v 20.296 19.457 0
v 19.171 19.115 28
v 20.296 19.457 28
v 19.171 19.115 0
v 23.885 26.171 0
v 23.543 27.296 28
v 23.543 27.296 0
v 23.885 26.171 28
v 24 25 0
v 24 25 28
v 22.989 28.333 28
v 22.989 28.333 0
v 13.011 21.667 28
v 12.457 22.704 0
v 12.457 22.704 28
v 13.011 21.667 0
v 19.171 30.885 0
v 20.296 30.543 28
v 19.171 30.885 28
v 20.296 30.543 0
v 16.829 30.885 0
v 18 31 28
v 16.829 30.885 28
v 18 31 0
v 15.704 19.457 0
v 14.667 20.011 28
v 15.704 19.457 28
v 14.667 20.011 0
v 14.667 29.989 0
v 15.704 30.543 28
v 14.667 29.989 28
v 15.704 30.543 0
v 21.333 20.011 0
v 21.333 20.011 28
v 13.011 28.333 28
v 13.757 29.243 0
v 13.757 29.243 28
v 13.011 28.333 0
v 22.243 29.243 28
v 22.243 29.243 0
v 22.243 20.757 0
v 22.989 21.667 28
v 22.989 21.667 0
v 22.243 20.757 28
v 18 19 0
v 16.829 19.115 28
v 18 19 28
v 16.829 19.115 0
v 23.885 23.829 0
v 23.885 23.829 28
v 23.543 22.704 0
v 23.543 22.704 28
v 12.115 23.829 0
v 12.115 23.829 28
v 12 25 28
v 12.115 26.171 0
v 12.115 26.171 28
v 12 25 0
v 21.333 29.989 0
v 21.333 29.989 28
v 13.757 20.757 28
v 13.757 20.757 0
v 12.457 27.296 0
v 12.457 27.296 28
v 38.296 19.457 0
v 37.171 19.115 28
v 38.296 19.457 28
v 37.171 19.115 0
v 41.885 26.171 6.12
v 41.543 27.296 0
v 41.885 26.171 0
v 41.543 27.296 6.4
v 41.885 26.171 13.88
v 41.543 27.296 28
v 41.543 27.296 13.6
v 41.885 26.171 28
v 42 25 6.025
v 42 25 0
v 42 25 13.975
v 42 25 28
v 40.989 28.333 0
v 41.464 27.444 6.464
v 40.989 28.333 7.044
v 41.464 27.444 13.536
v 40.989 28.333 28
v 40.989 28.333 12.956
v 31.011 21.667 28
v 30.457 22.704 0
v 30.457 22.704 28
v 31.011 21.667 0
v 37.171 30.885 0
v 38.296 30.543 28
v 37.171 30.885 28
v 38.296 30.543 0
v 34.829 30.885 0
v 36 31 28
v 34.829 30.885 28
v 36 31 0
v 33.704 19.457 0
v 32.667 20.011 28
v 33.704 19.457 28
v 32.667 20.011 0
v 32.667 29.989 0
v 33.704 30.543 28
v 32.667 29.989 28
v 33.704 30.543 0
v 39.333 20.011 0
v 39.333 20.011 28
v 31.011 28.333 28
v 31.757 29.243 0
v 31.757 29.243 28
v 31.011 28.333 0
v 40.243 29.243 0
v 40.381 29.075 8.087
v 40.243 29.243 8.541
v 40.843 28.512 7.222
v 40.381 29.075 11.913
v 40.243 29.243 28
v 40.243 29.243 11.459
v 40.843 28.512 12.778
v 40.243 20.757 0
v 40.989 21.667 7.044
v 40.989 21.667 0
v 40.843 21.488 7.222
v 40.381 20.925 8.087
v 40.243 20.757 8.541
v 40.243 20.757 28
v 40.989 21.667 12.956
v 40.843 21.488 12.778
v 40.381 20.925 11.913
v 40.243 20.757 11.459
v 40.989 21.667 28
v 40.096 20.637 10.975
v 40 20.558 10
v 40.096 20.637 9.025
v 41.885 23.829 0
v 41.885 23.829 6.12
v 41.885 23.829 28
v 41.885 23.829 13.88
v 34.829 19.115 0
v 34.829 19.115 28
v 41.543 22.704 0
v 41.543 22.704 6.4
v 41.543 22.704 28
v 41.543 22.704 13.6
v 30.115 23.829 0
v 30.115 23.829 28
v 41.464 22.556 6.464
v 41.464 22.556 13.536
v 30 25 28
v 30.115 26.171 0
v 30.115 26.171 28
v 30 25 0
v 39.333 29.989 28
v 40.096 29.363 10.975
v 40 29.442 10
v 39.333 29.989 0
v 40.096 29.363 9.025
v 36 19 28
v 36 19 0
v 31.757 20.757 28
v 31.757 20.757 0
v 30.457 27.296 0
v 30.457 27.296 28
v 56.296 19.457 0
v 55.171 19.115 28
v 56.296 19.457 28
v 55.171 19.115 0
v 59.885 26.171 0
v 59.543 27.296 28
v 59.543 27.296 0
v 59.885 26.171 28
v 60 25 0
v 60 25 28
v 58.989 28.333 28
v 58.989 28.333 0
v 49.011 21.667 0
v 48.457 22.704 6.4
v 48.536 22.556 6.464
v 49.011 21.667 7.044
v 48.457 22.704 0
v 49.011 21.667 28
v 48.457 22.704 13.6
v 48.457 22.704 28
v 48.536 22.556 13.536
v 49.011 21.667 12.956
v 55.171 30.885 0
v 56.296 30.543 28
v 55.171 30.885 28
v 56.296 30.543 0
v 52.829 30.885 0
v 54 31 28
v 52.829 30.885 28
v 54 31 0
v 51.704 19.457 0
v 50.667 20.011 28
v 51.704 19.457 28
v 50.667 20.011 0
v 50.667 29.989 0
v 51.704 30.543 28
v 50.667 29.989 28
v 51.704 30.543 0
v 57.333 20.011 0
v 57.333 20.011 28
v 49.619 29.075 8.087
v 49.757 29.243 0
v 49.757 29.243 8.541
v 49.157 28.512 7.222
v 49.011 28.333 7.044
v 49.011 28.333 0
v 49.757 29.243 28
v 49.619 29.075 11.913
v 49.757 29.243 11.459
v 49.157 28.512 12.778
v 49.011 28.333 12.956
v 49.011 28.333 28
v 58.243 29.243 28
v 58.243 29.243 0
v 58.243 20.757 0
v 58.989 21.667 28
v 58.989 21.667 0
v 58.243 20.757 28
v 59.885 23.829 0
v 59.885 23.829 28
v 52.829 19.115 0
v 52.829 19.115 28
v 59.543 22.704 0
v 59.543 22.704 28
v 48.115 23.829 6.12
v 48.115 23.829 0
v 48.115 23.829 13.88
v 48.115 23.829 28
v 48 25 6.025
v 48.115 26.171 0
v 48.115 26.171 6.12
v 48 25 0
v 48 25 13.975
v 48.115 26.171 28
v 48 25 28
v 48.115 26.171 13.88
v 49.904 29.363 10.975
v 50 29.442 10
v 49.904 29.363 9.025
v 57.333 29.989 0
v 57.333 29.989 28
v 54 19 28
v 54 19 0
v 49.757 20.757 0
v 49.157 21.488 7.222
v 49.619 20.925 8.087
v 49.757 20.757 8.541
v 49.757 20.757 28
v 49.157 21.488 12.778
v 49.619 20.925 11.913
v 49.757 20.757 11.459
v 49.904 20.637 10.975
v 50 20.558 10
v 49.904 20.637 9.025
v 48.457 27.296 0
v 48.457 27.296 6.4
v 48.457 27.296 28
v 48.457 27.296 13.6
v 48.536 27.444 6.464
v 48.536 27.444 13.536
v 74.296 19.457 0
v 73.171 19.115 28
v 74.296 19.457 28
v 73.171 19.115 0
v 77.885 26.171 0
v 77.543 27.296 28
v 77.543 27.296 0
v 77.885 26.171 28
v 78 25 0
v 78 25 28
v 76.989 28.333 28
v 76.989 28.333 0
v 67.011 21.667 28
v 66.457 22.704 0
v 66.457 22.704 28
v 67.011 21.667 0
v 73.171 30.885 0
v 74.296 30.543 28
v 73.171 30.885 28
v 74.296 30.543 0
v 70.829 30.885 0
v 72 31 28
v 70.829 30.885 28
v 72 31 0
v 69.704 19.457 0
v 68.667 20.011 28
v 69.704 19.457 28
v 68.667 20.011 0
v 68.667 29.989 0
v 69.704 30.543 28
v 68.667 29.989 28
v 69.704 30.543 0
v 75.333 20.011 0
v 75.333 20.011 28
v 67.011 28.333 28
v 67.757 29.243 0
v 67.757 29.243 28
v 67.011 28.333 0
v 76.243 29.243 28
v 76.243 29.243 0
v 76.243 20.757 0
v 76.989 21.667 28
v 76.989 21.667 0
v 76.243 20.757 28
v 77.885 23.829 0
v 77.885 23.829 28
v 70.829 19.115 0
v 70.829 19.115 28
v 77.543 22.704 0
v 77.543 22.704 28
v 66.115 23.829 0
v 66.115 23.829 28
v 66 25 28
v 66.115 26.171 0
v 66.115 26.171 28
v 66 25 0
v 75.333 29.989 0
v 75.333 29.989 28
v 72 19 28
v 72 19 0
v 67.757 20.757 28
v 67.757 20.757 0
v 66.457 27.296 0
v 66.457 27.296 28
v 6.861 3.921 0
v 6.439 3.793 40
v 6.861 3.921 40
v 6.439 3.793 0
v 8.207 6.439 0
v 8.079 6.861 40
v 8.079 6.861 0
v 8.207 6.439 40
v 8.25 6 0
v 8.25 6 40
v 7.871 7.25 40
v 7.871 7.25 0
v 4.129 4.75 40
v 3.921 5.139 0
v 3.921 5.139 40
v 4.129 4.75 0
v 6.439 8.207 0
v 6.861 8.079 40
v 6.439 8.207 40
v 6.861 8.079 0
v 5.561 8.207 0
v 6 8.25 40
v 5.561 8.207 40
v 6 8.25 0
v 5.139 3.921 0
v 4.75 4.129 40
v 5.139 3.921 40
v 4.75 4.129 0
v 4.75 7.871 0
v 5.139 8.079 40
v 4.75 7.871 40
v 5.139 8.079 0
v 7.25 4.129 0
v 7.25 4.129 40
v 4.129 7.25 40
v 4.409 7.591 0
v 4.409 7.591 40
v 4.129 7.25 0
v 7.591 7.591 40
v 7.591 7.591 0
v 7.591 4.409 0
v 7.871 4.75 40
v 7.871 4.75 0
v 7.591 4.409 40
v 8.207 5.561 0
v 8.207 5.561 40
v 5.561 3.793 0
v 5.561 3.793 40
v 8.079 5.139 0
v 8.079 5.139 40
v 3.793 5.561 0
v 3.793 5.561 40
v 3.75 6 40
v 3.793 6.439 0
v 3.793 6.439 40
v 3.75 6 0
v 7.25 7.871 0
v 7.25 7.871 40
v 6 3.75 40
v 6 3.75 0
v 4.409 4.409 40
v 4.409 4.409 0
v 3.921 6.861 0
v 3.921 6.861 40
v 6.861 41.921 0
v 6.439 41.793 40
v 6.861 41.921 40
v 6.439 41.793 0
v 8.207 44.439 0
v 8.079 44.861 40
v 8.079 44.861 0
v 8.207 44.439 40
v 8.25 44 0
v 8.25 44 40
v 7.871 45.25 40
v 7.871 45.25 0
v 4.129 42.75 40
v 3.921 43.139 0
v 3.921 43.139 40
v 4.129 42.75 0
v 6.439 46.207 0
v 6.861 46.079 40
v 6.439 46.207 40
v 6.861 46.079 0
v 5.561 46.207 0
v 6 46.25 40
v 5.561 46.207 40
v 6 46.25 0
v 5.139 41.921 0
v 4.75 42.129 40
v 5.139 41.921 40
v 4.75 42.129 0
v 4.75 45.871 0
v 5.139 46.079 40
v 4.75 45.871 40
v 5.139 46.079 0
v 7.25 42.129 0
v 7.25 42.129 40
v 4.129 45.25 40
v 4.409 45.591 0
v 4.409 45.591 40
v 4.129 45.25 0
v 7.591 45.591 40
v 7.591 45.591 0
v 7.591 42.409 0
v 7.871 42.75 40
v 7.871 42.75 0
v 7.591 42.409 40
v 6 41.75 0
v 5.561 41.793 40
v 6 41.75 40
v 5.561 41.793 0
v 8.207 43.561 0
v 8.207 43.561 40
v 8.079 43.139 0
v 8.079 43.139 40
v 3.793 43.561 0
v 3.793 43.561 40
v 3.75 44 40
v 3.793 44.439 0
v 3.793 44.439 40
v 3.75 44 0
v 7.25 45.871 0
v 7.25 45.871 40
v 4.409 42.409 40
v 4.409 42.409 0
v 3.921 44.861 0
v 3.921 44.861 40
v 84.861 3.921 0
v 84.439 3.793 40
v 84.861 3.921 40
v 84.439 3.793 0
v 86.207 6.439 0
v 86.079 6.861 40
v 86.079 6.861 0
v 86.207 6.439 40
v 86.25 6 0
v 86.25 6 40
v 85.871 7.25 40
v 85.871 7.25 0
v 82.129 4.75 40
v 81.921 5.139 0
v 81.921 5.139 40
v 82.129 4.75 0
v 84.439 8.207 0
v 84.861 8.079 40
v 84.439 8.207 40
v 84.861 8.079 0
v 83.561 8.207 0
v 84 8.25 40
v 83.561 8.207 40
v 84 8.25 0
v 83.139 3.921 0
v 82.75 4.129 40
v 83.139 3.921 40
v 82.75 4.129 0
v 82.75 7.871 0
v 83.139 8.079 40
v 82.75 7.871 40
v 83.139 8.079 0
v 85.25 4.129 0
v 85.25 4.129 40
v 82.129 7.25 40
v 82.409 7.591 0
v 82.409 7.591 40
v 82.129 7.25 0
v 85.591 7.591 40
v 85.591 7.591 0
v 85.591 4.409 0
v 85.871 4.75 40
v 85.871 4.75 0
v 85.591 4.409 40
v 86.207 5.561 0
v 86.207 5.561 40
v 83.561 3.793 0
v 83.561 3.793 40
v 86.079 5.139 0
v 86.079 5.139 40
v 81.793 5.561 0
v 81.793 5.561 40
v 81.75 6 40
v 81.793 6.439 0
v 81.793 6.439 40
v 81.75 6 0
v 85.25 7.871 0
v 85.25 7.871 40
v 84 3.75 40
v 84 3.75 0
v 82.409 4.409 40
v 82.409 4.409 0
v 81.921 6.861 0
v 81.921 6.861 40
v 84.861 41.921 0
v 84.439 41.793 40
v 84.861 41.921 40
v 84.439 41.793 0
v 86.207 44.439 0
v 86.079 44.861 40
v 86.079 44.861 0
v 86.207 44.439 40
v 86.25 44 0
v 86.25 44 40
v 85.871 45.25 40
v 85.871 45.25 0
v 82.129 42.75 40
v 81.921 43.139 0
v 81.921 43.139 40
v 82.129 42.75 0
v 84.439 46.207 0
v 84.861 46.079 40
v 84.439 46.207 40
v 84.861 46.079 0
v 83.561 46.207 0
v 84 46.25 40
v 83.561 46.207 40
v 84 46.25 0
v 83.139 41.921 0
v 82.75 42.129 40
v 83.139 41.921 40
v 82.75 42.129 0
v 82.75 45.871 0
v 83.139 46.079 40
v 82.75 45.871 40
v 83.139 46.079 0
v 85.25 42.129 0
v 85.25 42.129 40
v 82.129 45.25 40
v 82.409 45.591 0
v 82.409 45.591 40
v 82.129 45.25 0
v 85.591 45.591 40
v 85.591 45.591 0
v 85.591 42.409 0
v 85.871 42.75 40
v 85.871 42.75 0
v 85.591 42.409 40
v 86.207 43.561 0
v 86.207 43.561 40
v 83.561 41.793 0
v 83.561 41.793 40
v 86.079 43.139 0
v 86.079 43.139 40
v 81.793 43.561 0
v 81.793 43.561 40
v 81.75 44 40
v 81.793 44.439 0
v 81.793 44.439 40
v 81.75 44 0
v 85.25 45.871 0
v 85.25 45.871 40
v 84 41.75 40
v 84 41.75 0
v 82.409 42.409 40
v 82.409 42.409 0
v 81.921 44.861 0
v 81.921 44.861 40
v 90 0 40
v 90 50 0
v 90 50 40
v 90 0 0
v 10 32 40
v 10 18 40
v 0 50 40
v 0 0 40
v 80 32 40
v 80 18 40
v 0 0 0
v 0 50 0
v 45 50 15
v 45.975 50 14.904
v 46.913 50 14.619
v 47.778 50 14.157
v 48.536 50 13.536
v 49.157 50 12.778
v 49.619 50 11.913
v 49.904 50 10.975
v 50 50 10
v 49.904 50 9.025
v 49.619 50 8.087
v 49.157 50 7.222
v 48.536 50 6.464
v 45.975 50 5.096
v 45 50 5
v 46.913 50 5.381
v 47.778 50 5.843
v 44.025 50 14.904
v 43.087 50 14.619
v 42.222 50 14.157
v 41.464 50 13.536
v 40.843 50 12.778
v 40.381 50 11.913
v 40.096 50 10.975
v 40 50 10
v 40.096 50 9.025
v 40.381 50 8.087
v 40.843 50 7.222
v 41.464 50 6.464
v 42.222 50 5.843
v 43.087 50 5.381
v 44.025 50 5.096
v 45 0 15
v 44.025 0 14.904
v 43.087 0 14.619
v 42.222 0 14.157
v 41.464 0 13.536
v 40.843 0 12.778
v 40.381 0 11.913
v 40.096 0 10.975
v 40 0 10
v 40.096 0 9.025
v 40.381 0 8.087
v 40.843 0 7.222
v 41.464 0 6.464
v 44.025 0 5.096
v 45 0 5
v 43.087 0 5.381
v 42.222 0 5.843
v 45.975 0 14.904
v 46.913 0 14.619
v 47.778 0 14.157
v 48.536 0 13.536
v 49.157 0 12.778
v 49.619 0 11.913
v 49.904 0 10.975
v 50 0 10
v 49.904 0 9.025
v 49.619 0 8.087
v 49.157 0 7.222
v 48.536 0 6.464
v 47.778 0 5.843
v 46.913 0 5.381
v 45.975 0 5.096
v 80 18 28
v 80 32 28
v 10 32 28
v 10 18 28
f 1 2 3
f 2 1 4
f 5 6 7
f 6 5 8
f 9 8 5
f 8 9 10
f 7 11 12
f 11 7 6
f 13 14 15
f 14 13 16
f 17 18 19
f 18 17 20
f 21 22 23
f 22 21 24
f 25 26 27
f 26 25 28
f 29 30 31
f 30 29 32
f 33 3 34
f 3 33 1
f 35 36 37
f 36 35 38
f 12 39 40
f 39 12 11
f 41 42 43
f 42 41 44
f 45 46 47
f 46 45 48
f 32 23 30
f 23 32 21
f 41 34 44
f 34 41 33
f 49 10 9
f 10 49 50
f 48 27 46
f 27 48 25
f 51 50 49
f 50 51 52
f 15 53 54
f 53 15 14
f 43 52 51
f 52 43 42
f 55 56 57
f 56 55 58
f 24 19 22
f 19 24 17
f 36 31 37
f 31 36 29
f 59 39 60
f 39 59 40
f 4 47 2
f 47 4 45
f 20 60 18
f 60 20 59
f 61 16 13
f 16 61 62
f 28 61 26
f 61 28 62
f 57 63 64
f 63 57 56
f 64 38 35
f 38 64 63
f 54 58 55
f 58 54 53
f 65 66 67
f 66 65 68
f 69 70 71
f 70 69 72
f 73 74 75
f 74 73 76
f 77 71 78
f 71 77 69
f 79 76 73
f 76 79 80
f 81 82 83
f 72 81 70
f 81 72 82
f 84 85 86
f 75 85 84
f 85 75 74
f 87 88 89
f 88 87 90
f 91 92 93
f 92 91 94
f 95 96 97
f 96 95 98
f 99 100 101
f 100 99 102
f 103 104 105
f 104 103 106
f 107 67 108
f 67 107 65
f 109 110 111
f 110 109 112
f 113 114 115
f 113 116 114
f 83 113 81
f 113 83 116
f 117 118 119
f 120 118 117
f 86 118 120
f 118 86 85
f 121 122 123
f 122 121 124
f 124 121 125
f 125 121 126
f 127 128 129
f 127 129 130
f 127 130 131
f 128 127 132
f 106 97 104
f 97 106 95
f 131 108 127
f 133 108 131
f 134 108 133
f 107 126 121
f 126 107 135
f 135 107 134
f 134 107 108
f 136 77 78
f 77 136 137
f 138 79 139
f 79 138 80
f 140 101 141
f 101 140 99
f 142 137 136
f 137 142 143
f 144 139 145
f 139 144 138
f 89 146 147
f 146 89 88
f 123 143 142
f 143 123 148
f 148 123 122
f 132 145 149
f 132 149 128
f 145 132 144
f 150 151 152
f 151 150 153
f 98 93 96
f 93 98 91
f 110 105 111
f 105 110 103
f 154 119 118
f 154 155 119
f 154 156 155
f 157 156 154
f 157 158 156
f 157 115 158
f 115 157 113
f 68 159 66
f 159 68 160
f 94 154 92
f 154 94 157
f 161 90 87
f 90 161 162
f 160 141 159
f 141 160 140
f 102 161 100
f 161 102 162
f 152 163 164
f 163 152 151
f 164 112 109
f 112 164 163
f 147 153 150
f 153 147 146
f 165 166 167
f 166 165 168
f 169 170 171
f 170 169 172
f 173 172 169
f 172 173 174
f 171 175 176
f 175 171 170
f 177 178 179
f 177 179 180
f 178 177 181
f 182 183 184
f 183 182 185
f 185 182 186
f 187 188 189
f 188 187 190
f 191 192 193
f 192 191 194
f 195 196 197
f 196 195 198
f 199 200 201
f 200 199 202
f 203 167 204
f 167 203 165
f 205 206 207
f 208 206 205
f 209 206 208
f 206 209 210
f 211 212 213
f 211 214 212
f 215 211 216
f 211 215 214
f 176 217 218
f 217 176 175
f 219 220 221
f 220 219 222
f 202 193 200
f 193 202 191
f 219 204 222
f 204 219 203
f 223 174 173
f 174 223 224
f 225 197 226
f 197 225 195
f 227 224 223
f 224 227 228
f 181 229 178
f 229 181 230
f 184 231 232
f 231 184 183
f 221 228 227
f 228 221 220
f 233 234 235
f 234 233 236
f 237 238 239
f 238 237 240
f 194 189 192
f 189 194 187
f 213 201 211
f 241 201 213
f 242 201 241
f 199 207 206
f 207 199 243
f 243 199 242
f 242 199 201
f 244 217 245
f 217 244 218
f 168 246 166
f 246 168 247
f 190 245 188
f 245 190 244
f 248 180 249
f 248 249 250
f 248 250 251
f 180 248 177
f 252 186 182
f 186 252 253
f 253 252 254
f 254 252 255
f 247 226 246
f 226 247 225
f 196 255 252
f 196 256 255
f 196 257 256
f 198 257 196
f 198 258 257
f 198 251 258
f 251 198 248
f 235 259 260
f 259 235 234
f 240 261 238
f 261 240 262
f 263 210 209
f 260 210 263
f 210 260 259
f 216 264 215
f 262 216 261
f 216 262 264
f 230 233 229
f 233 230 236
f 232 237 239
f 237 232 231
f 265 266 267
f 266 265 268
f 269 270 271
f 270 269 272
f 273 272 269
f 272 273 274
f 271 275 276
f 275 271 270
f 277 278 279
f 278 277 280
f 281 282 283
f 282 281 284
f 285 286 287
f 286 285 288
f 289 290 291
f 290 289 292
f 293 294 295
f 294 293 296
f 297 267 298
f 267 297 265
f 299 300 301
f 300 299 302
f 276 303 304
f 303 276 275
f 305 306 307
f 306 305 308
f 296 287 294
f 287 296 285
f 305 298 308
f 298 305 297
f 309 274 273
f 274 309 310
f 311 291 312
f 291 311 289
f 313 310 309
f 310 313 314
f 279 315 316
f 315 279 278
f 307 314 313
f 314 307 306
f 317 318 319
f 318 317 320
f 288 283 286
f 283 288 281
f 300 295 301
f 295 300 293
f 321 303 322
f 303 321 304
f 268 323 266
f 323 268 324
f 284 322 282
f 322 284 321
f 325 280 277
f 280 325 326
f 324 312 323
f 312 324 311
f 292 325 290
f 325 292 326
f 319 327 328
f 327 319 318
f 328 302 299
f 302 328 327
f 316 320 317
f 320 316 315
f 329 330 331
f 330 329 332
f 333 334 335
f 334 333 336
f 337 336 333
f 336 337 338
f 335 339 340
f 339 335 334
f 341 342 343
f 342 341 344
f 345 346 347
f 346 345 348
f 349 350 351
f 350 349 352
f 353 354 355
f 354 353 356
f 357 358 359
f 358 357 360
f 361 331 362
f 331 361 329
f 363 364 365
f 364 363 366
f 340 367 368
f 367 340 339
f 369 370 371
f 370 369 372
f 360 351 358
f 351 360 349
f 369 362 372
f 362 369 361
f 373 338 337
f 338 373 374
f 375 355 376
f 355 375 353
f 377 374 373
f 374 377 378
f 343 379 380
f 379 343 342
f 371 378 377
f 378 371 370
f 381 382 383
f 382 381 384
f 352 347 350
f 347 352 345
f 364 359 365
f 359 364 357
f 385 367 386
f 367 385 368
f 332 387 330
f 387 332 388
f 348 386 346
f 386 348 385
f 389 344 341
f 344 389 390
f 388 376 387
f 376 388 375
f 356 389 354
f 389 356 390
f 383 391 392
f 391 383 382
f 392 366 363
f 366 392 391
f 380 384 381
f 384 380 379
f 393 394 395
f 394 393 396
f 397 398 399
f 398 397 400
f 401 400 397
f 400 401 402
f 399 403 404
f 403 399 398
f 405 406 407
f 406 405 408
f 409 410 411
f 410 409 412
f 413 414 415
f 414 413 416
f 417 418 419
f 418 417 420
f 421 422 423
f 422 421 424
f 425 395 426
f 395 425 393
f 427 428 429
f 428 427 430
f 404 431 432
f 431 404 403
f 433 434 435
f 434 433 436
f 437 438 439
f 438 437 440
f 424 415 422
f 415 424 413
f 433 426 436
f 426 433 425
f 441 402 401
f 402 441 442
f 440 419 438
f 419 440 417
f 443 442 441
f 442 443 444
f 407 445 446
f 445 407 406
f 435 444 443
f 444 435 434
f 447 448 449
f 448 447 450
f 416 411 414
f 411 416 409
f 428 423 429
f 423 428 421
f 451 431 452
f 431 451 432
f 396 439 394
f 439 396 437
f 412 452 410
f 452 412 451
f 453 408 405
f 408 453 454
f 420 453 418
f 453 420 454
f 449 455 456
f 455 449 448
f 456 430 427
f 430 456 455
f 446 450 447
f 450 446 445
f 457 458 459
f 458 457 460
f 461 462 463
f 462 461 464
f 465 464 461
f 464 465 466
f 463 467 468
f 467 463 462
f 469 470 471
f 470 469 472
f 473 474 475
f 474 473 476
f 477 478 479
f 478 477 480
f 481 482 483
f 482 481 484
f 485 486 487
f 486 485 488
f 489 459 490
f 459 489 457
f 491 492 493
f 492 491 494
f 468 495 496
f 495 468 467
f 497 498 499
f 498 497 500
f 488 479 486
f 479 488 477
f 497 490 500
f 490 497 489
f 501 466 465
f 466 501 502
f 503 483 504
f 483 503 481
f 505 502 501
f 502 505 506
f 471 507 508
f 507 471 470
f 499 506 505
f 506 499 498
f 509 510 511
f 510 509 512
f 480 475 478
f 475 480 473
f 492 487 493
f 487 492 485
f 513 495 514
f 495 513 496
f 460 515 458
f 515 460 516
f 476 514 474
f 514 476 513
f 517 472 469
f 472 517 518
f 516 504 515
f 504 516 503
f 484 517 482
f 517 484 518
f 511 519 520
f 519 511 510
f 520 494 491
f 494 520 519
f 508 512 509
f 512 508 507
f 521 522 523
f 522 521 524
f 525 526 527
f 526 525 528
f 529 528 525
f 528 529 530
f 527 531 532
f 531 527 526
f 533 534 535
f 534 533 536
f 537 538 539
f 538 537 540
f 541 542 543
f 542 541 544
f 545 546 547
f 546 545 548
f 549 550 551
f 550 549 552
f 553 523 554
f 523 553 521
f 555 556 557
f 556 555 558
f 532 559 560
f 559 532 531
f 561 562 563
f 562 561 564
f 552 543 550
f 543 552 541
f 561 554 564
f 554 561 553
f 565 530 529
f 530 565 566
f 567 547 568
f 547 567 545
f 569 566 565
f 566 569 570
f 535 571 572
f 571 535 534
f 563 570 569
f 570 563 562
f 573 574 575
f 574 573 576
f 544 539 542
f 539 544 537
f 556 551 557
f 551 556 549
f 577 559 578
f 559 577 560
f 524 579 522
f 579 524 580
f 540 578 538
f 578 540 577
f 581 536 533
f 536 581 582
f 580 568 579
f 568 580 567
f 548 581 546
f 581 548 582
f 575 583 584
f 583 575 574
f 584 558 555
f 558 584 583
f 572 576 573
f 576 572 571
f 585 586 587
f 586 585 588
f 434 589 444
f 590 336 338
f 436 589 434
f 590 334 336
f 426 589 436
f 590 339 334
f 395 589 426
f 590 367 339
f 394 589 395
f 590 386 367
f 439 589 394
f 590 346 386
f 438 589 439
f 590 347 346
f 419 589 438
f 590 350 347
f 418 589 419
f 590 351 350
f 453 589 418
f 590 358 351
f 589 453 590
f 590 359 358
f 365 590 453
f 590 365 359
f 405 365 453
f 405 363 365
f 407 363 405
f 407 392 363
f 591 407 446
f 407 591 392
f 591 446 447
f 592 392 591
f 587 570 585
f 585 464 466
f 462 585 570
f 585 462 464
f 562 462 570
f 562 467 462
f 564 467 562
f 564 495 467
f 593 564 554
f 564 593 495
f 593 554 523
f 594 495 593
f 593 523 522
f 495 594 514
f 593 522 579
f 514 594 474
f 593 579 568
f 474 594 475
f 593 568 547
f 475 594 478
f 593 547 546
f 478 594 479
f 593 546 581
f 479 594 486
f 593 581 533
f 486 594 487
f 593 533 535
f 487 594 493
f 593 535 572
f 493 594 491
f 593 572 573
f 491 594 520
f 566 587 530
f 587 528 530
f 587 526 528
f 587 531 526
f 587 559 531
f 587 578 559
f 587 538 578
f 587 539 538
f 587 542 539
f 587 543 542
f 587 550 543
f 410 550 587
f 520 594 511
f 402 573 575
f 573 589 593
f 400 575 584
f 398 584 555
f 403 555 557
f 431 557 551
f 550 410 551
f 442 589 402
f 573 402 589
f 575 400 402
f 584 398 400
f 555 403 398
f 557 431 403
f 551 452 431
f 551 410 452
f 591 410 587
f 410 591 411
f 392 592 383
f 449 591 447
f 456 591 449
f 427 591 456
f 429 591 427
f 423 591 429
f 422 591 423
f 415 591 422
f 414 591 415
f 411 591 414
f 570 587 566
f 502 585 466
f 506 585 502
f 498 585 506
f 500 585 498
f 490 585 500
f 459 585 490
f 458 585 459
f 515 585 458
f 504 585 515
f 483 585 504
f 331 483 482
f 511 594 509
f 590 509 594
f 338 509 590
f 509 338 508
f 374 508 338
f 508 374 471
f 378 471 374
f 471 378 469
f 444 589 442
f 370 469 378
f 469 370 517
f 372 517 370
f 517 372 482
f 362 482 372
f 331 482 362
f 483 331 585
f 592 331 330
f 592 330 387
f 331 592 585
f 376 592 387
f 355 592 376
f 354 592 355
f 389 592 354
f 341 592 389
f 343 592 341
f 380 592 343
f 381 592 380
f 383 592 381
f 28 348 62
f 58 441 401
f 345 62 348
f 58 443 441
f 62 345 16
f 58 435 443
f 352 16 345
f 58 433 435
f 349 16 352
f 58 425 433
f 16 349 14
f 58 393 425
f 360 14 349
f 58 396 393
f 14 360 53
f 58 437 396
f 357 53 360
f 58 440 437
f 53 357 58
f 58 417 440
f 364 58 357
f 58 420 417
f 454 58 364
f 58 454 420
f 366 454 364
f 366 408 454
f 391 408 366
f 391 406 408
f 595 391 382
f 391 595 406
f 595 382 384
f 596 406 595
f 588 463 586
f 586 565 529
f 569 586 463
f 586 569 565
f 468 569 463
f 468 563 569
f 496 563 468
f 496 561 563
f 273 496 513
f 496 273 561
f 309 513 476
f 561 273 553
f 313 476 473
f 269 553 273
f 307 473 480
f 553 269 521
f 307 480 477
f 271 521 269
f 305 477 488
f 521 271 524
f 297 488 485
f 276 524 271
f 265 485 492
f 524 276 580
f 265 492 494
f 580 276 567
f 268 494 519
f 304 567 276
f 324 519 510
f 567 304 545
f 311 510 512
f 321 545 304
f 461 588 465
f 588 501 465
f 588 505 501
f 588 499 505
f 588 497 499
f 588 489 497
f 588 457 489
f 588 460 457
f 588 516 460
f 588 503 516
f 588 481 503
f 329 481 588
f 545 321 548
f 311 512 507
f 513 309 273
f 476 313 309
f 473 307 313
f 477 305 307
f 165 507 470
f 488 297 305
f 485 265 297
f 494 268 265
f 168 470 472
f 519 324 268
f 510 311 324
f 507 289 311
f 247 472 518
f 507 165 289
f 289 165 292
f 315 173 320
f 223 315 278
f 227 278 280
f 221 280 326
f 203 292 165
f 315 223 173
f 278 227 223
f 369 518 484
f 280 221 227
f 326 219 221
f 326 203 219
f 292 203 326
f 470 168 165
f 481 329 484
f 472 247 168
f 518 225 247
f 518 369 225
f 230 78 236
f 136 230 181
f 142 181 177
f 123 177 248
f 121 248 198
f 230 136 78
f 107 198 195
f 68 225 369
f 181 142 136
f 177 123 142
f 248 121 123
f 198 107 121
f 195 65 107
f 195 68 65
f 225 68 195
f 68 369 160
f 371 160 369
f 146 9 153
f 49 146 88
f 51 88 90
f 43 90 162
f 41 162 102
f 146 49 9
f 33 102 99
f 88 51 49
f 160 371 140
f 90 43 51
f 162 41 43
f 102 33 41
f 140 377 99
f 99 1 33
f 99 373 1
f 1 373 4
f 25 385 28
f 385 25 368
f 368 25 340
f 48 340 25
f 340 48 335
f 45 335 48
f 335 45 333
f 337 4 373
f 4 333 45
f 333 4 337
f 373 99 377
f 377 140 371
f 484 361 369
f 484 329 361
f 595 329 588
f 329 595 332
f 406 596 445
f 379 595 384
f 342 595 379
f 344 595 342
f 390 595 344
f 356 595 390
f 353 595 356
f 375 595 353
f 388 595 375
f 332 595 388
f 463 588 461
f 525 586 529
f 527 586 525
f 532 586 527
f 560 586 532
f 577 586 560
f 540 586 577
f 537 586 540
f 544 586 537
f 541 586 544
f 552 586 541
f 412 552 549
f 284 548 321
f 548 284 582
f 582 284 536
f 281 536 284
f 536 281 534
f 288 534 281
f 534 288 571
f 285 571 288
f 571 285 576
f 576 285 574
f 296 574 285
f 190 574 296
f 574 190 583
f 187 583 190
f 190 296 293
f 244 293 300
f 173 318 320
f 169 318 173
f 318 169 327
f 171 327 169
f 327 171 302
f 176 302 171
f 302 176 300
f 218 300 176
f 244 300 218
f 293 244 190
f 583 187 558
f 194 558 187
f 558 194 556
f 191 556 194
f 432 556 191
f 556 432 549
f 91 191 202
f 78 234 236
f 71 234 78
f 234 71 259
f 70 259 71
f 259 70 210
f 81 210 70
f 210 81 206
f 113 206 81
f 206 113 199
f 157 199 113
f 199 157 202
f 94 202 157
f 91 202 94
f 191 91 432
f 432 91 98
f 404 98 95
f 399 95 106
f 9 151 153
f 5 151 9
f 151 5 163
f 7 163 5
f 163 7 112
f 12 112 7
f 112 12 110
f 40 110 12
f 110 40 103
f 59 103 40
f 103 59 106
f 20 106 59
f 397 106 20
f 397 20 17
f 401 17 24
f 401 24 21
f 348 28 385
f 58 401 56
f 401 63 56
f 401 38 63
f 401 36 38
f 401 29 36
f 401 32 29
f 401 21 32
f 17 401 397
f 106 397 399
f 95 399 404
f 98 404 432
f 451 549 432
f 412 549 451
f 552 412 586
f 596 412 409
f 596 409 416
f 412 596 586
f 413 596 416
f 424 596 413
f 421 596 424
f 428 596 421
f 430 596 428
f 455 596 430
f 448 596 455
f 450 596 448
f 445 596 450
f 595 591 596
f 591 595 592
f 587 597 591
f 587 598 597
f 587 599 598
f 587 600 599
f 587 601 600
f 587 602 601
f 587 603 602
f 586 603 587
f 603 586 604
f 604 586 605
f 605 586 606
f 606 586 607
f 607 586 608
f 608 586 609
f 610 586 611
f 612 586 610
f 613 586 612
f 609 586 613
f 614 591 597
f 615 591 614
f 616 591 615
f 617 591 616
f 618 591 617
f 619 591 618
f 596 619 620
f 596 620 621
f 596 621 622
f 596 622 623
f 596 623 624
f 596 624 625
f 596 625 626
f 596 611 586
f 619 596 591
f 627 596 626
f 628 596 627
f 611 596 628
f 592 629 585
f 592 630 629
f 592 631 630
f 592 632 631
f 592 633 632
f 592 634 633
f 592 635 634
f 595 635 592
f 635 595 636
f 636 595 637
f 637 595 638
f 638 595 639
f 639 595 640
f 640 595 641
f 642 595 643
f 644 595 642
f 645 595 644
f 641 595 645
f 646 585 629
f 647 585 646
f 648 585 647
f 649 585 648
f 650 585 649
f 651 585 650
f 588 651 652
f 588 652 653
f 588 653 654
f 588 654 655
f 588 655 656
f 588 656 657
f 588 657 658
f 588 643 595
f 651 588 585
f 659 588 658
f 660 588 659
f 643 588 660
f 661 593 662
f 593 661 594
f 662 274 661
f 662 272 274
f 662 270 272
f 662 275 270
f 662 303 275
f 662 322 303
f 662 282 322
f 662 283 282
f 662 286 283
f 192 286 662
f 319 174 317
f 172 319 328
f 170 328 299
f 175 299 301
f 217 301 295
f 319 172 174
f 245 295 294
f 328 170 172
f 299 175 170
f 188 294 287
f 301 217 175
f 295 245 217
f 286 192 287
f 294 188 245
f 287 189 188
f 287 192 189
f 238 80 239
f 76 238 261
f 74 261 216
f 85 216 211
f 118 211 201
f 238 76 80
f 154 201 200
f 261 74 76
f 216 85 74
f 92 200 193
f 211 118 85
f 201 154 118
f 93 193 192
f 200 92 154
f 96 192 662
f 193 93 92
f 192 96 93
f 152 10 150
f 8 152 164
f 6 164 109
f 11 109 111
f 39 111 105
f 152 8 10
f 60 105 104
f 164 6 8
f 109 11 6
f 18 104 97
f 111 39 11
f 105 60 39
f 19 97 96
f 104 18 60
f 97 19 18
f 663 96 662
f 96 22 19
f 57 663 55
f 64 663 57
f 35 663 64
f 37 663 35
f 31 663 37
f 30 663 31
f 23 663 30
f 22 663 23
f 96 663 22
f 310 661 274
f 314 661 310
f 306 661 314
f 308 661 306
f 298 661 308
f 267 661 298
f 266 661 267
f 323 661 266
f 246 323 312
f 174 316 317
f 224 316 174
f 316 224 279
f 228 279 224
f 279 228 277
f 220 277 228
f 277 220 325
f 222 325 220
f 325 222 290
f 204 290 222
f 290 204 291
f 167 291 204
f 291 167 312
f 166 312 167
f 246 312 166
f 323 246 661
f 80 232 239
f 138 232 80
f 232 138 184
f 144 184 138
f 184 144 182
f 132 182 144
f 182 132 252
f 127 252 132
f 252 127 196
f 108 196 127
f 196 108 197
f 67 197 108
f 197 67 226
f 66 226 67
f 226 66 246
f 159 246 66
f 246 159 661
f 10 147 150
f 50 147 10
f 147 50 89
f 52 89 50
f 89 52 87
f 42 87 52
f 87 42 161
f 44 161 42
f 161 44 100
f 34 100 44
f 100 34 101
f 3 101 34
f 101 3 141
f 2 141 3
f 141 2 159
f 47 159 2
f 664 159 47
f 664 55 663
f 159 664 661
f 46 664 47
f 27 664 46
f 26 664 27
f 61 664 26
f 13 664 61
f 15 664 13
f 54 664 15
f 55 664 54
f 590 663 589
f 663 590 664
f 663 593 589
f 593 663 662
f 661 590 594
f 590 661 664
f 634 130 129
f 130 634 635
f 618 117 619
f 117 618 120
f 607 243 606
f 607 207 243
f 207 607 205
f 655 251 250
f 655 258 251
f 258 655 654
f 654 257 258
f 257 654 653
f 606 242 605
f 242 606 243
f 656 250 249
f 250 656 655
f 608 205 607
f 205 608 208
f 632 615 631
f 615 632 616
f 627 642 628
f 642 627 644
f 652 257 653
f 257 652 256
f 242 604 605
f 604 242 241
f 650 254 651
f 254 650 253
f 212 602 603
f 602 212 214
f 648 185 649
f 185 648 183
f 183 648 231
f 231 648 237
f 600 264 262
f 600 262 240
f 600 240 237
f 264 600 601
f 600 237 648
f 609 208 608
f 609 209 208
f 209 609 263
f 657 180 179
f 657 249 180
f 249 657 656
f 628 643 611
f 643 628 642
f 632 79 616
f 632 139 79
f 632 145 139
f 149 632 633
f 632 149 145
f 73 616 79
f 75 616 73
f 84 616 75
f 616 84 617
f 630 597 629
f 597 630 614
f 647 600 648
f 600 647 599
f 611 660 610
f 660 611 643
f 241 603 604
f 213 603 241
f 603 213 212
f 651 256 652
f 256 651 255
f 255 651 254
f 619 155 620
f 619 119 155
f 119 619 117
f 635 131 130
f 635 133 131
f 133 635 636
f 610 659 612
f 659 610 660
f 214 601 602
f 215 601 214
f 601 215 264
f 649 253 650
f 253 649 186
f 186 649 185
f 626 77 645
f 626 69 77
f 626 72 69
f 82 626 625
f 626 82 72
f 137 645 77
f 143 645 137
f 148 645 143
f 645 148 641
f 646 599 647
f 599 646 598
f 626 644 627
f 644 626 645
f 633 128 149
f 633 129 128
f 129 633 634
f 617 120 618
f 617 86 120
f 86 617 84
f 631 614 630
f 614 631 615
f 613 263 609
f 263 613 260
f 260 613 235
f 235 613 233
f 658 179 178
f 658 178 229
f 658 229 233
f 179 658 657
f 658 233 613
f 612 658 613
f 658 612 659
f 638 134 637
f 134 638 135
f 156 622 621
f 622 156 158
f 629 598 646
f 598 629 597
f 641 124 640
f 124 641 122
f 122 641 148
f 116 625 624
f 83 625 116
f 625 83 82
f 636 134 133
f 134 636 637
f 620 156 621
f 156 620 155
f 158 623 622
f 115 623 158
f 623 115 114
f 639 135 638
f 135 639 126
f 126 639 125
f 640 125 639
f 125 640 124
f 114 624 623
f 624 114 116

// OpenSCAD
$fn = 32;

// ----------------------------------------------------------------------
// Manifold block: side_outlet manifold
// ----------------------------------------------------------------------

// --- parameters (mm) ---
block_l = 90;             // block length, X
block_w = 50;             // block width, Y
block_h = 40;             // block height, Z
port_d = 12;              // port bore diameter
port_pitch = 18;          // port pitch along X
gallery_d = 14;           // top gallery width, Y
gallery_depth = 12;       // gallery pocket depth
wall_p = 10;              // gallery end wall thickness, X
mnt_d = 4.5;              // mounting hole diameter
mnt_in = 6;               // mounting hole inset from the edges
out_d = 10;               // outlet bore diameter
out_z = 10;               // outlet axis height

n_ports = 4;  // ports in the row
port_x0 = (block_l - (n_ports - 1) * port_pitch) / 2;  // first port X

difference() {
  cube([block_l, block_w, block_h]);
  for (i = [0 : n_ports - 1])
    translate([port_x0 + i * port_pitch, block_w / 2, -1])
      cylinder(h = block_h + 2, d = port_d);
  translate([wall_p, block_w / 2 - gallery_d / 2, block_h - gallery_depth])
    cube([block_l - 2 * wall_p, gallery_d, gallery_depth + 1]);
  for (cx = [mnt_in, block_l - mnt_in])
    for (cy = [mnt_in, block_w - mnt_in])
      translate([cx, cy, -1]) cylinder(h = block_h + 2, d = mnt_d);
  translate([block_l / 2, -1, out_z]) rotate([-90, 0, 0])
    cylinder(h = block_w + 2, d = out_d);
}
